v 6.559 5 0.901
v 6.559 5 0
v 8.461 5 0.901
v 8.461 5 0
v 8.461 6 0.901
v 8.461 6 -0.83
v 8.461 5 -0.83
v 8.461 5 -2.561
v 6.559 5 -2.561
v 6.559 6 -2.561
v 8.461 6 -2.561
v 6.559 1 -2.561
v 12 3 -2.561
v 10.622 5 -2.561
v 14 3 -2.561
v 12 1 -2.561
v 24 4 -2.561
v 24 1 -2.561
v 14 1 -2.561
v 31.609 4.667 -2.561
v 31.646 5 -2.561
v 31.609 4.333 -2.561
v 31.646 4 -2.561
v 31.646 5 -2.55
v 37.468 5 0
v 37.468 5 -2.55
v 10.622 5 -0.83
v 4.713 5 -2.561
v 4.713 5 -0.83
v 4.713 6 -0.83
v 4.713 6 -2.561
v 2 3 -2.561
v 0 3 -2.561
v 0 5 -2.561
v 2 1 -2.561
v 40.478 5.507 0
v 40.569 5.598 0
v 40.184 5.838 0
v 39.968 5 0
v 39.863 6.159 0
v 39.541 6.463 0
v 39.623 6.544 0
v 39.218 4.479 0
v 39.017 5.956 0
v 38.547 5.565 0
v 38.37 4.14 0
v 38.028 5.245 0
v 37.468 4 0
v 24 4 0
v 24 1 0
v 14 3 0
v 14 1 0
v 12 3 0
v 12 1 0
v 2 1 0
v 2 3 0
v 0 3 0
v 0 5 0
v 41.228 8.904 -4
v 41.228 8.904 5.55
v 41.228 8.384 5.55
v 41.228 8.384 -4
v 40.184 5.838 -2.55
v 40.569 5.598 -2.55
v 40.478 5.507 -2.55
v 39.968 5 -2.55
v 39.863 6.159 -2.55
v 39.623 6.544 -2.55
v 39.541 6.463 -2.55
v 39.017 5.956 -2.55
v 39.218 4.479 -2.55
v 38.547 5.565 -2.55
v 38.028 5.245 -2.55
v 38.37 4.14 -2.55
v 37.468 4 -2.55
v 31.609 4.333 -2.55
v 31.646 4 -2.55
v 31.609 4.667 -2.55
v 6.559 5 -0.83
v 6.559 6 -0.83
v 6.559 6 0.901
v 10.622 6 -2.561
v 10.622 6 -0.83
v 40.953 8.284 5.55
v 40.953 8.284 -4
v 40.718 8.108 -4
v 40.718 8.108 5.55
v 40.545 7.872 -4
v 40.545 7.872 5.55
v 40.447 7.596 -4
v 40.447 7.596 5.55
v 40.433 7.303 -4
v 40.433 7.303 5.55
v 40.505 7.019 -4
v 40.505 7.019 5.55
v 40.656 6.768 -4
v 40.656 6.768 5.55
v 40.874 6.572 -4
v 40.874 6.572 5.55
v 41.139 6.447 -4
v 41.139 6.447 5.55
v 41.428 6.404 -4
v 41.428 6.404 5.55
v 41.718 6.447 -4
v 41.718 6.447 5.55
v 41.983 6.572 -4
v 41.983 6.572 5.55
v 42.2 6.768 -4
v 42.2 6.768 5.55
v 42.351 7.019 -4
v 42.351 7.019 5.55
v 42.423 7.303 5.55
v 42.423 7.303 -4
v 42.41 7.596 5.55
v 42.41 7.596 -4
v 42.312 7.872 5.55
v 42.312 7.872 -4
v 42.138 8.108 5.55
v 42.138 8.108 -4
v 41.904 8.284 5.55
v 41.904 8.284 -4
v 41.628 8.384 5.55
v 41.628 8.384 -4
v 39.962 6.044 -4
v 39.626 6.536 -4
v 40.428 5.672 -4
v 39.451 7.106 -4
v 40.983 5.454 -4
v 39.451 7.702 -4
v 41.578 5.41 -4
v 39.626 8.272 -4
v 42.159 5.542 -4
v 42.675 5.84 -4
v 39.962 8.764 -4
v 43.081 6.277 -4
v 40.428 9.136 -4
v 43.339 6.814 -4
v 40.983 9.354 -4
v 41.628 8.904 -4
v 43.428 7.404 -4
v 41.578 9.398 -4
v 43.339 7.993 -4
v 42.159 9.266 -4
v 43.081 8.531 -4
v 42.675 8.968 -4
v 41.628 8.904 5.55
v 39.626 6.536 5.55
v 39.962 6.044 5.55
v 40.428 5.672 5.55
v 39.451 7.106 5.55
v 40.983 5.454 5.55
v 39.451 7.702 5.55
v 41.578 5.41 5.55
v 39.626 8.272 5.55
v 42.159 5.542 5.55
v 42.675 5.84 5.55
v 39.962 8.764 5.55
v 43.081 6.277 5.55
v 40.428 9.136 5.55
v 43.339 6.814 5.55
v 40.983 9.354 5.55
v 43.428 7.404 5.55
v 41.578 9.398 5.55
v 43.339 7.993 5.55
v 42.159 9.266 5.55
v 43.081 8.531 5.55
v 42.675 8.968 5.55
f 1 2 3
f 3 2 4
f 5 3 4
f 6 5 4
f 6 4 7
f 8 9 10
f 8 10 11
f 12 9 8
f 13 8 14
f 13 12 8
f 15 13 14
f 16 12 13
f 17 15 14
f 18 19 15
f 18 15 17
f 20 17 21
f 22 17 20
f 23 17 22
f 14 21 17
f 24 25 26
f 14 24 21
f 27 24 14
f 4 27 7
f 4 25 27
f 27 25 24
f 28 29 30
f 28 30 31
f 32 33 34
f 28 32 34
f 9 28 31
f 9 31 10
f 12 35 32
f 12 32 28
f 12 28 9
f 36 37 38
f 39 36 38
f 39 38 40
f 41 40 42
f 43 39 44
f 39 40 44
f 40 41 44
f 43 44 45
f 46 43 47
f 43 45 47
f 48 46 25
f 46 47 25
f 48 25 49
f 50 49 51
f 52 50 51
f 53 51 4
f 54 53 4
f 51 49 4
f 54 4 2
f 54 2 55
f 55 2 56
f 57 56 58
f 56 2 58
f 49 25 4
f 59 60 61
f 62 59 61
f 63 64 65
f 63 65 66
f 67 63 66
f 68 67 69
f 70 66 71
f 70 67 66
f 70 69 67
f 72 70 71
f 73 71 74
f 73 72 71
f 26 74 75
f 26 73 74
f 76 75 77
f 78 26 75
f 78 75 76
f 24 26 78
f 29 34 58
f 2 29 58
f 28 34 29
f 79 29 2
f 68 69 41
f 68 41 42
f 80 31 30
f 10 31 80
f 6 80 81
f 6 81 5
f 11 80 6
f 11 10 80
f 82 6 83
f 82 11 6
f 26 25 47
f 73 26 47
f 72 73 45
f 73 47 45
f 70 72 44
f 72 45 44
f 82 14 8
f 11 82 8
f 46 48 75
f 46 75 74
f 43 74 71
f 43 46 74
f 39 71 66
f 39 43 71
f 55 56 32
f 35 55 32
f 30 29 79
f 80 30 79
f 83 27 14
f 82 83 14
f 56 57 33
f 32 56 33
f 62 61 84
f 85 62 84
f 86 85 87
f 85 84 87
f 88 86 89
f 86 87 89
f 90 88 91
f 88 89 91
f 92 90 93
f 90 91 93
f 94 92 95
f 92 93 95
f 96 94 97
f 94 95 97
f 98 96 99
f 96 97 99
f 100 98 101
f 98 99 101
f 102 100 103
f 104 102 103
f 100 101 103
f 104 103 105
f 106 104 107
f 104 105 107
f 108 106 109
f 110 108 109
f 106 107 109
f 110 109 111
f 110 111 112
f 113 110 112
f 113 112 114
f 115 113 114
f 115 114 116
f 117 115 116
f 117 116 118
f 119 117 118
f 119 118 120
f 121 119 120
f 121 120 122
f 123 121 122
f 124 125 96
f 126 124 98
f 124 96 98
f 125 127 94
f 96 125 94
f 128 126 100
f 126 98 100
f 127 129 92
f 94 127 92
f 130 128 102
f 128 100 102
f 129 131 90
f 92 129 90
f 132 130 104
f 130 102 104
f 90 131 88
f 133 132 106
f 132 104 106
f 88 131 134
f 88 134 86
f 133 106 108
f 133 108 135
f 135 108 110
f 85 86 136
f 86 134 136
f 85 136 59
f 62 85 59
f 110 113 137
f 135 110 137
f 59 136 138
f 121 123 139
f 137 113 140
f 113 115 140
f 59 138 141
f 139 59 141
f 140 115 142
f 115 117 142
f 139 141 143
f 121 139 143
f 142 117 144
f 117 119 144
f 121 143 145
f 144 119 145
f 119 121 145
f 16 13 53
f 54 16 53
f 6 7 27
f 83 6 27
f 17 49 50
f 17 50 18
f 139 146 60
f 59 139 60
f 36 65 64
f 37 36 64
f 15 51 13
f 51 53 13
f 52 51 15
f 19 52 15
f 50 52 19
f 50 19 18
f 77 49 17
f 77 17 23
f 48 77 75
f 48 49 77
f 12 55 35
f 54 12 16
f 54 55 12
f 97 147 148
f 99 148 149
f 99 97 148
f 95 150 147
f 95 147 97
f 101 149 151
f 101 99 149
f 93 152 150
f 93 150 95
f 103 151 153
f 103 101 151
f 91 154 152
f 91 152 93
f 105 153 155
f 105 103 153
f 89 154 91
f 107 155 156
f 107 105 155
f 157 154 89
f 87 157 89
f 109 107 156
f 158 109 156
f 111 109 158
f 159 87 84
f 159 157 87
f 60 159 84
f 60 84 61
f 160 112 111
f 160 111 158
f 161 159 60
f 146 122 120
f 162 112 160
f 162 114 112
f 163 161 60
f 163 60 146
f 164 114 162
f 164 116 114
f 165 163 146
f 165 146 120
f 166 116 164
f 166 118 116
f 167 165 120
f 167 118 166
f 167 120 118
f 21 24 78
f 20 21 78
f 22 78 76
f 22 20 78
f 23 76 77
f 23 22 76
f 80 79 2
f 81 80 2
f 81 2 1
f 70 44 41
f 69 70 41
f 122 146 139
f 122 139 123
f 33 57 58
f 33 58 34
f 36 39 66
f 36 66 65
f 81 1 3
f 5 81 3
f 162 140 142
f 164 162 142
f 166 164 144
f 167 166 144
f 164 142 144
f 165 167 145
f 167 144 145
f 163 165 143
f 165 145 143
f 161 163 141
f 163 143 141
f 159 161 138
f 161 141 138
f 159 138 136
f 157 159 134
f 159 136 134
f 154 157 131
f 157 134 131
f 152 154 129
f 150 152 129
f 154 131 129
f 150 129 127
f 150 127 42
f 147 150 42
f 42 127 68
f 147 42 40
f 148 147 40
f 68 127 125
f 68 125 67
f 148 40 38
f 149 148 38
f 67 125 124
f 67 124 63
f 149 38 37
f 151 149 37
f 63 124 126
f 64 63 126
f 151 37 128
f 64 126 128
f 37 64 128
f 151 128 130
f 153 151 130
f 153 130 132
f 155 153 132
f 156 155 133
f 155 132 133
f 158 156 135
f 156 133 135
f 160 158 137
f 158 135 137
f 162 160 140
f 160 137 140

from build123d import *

# Parameters (mm, degrees)
SKETCH1_W                 = 14
SKETCH1_H                 = 10
BOSS_EXTRUDE1_DEPTH       = 5
SKETCH2_W                 = 1.137458902
SKETCH2_H                 = 1.700915576
SKETCH2_W_2               = 1
SKETCH2_H_2               = 2
BOSS_EXTRUDE2_DEPTH       = 3
SKETCH3_W                 = 14
SKETCH3_H                 = 10
CUT_EXTRUDE1_DEPTH        = 3
BOSS_EXTRUDE3_DEPTH       = 9
SKETCH6_W                 = 10
SKETCH6_H                 = 2
BOSS_EXTRUDE4_DEPTH       = 43
BOSS_EXTRUDE5_DEPTH       = 23
BOSS_EXTRUDE5_DEPTH_BACK  = 14
SKETCH7_R                 = 5
SKETCH8_W                 = 10
SKETCH8_H                 = 3
BOSS_EXTRUDE6_DEPTH       = 9
SKETCH9_W                 = 1.004791017
SKETCH9_H                 = 1.799084424
SKETCH9_W_2               = 0.997604491
SKETCH9_W_3               = 1.997604492
SKETCH9_H_2               = 1.5
BOSS_EXTRUDE7_DEPTH       = 3
SKETCH10_W                = 1.001197754
SKETCH10_H                = 2.999195309
CUT_EXTRUDE2_DEPTH        = 3
CUT_EXTRUDE3_DEPTH        = 43
SKETCH12_W                = 2.137458902
SKETCH12_H                = 2
SKETCH12_W_2              = 1
SKETCH12_H_2              = 1.700915576
SKETCH12_W_3              = 0.862541098
SKETCH12_W_4              = 1.997604492
SKETCH12_H_3              = 1.5
SKETCH12_H_4              = 3
SKETCH12_W_5              = 1.001197754
CUT_EXTRUDE4_DEPTH        = 4
SKETCH14_W                = 28.101020514
SKETCH14_H                = 7
CUT_EXTRUDE6_DEPTH        = 4
SKETCH15_W                = 1.997604492
SKETCH15_H                = 1.337298545
SKETCH15_W_2              = 2.137458902
SKETCH15_H_2              = 1.038214121
BOSS_EXTRUDE8_DEPTH       = 1
SKETCH16_W                = 2.161329906
SKETCH16_H                = 1.731474724
SKETCH16_W_2              = 1.90188885
SKETCH16_H_2              = 1.406872125
SKETCH16_H_3              = 0.901189682
SKETCH16_W_3              = 1.846086898
SKETCH16_H_4              = 0.829910231
SKETCH16_H_5              = 0.438615045
BOSS_EXTRUDE9_DEPTH       = 1
SKETCH17_W                = 28.101020514
SKETCH17_H                = 3
CUT_EXTRUDE7_DEPTH        = 1
CUT_EXTRUDE8_START        = -7
SKETCH18_R                = 5
CUT_EXTRUDE8_DEPTH        = 7
SKETCH19_R                = 5
CUT_EXTRUDE9_DEPTH        = 8
CUT_EXTRUDE10_START       = -31
SKETCH20_R                = 5
CUT_EXTRUDE10_DEPTH       = 31
SKETCH21_W                = 17.497056098
SKETCH21_H                = 3
CUT_EXTRUDE11_DEPTH       = 31
SKETCH22_W                = 10
SKETCH22_H                = 3
CUT_EXTRUDE12_DEPTH       = 7
SKETCH23_W                = 1.90188885
SKETCH23_H                = 1.406872125
CUT_EXTRUDE13_DEPTH       = 2
BOSS_EXTRUDE10_DEPTH      = 10
BOSS_EXTRUDE10_DEPTH_BACK = 6
SKETCH24_R                = 3
CUT_EXTRUDE14_DEPTH       = 16
CUT_EXTRUDE18_START       = -10
SKETCH26_R                = 3
SKETCH26_R_2              = 2.5
CUT_EXTRUDE18_DEPTH       = 10
SKETCH27_R                = 3
CUT_EXTRUDE19_DEPTH       = 3
CUT_EXTRUDE20_START       = -4
SKETCH28_R                = 2.5
CUT_EXTRUDE20_DEPTH       = 4
CUT_EXTRUDE22_DEPTH       = 2
CUT_EXTRUDE22_DEPTH_BACK  = 7
SKETCH29_W                = 4.063218756
SKETCH29_H                = 0.438615045
SKETCH29_W_2              = 21.023429879
CUT_EXTRUDE23_START       = -10
SKETCH30_R                = 3
CUT_EXTRUDE23_DEPTH       = 10
BOSS_EXTRUDE11_START      = -2.55
BOSS_EXTRUDE11_DEPTH      = 2.55
BOSS_EXTRUDE12_DEPTH      = 7.55
BOSS_EXTRUDE12_DEPTH_BACK = 6
CUT_EXTRUDE24_DEPTH       = 13.55
BOSS_EXTRUDE13_DEPTH      = 2.55
BOSS_EXTRUDE14_DEPTH      = 6.55
BOSS_EXTRUDE14_DEPTH_BACK = 4
SKETCH35_R                = 2
CUT_EXTRUDE25_START       = -14.55
SKETCH36_R                = 2
CUT_EXTRUDE25_DEPTH       = 14.55
BOSS_EXTRUDE15_DEPTH      = 2.55
SKETCH38_R                = 1
CUT_EXTRUDE26_DEPTH       = 16.55
SKETCH39_R                = 2
CUT_EXTRUDE27_DEPTH       = 10.55
BOSS_EXTRUDE16_DEPTH      = 2.55
BOSS_EXTRUDE17_DEPTH      = 5.55
BOSS_EXTRUDE17_DEPTH_BACK = 4
SKETCH41_R                = 2
SKETCH42_R                = 1
CUT_EXTRUDE28_DEPTH       = 13.55


with BuildPart() as part:
    # Sketch1 → Boss-Extrude1 (new body)
    with BuildSketch(Plane(origin=(0, 0, 0), x_dir=(1, 0, 0), z_dir=(0, 1, 0))):
        with Locations((7, 5)):
            Rectangle(SKETCH1_W, SKETCH1_H)
    extrude(amount=BOSS_EXTRUDE1_DEPTH)

    # Sketch2 → Boss-Extrude2 (add)
    with BuildSketch(Plane(origin=(0, 5, 0), x_dir=(1, 0, 0), z_dir=(0, 1, 0))):
        with Locations((7.568729451, 6.812243667)):
            Rectangle(SKETCH2_W, SKETCH2_H)
        with Locations((6.5, 6.812243667)):
            Rectangle(SKETCH2_W_2, SKETCH2_H)
        Polygon((7, 5), (7, 5.961785879), (6, 5.961785879), (5, 5.961785879), (5, 5), align=None)
        Polygon((7, 3.961785879), (7, 5), (5, 5), (5, 3.961785879), (6, 3.961785879), align=None)
        Polygon((8.137458902, 5.961785879), (7, 5.961785879), (7, 5), (9, 5), (9, 5.961785879), align=None)
        Polygon((9, 5), (7, 5), (7, 3.961785879), (8.137458902, 3.961785879), (9, 3.961785879), align=None)
        with Locations((6.5, 2.961785879)):
            Rectangle(SKETCH2_W_2, SKETCH2_H_2)
        with Locations((7.568729451, 2.961785879)):
            Rectangle(SKETCH2_W, SKETCH2_H_2)
    extrude(amount=BOSS_EXTRUDE2_DEPTH)

    # Sketch3 → Cut-Extrude1 (cut)
    with BuildSketch(Plane.XZ):
        with Locations((7, -5)):
            Rectangle(SKETCH3_W, SKETCH3_H)
    extrude(amount=-CUT_EXTRUDE1_DEPTH, mode=Mode.SUBTRACT)

    # Sketch5 → Boss-Extrude3 (add)
    with BuildSketch(Plane.XZ.offset(-3)):
        Polygon((12, 0), (7, 0), (2, 0), (2, -3), (12, -3), align=None)
    extrude(amount=BOSS_EXTRUDE3_DEPTH)

    # Sketch6 → Boss-Extrude4 (add)
    with BuildSketch(Plane(origin=(14, 0, 0), x_dir=(0, 0, -1), z_dir=(1, 0, 0))):
        with Locations((5, 4)):
            Rectangle(SKETCH6_W, SKETCH6_H)
    extrude(amount=BOSS_EXTRUDE4_DEPTH)

    # Sketch7 → Boss-Extrude5 (add, two sides: drawn at the far end of the back side and taken through both)
    with BuildSketch(Plane.XY.offset(-BOSS_EXTRUDE5_DEPTH_BACK)):
        with Locations((57, 4)):
            Circle(SKETCH7_R)
    extrude(amount=BOSS_EXTRUDE5_DEPTH + BOSS_EXTRUDE5_DEPTH_BACK)

    # Sketch8 → Boss-Extrude6 (add)
    with BuildSketch(Plane(origin=(0, 3, 0), x_dir=(-1, 0, 0), z_dir=(0, -1, 0))):
        with Locations((-19, 1.5)):
            Rectangle(SKETCH8_W, SKETCH8_H)
    extrude(amount=BOSS_EXTRUDE6_DEPTH)

    # Sketch9 → Boss-Extrude7 (add)
    with BuildSketch(Plane(origin=(0, 5, 0), x_dir=(1, 0, 0), z_dir=(0, 1, 0))):
        Polygon((17.004791017, 6.161896764), (17.004791017, 5.457884441), (18.002395508, 5.20983516), (18.002395508, 6.161896764), align=None)
        Polygon((16, 6.161896764), (16, 5.707720615), (17.004791017, 5.457884441), (17.004791017, 6.161896764), (16.100648674, 6.161896764), align=None)
        Polygon((16, 5.707720615), (16, 4.961785879), (17.004791017, 4.961785879), (17.004791017, 5.457884441), align=None)
        Polygon((17.004791017, 5.457884441), (17.004791017, 4.961785879), (18.002395508, 4.961785879), (18.002395508, 5.20983516), align=None)
        with Locations((16.502395509, 4.062243667)):
            Rectangle(SKETCH9_W, SKETCH9_H)
        with Locations((17.503593263, 4.062243667)):
            Rectangle(SKETCH9_W_2, SKETCH9_H)
        Polygon((18.002395508, 5.20983516), (18.002395508, 4.961785879), (19, 4.961785879), align=None)
        Polygon((19, 4.961785879), (18.002395508, 4.961785879), (18.002395508, 3.162701455), (20, 3.162701455), (20, 4.662701455), (20, 6.162701455), (20, 7.662701455), (19, 7.662701455), (18.002395508, 7.662701455), (18.002395508, 6.161896764), (18.002395508, 5.20983516), align=None)
        Polygon((20, 4.662701455), (20, 3.162701455), (21, 3.162701455), (21, 6.162701455), (20, 6.162701455), align=None)
        with Locations((19.001197754, 2.412701455)):
            Rectangle(SKETCH9_W_3, SKETCH9_H_2)
    extrude(amount=BOSS_EXTRUDE7_DEPTH)

    # Sketch10 → Cut-Extrude2 (cut)
    with BuildSketch(Plane(origin=(0, 8, 0), x_dir=(1, 0, 0), z_dir=(0, 1, 0))):
        with Locations((16.500598877, 4.66229911)):
            Rectangle(SKETCH10_W, SKETCH10_H)
    extrude(amount=-CUT_EXTRUDE2_DEPTH, mode=Mode.SUBTRACT)

    # Sketch11 → Cut-Extrude3 (cut)
    with BuildSketch(Plane.XY.offset(23)):
        with BuildLine():
            Line((56.5, 6.795107369), (56.5, 5.936491673))
            ThreePointArc((56.5, 5.936491673), (56.747991415, 5.984059393), (57, 6))
            Line((57, 6), (57, 6.795107369))
            Line((57, 6.795107369), (56.5, 6.795107369))
        make_face()
        with BuildLine():
            ThreePointArc((57, 6), (57.252008585, 5.984059393), (57.5, 5.936491673))
            Line((57.5, 5.936491673), (57.5, 6.795107369))
            Line((57.5, 6.795107369), (57, 6.795107369))
            Line((57, 6.795107369), (57, 6))
        make_face()
        with BuildLine():
            ThreePointArc((56.5, 5.936491673), (55.41886117, 5.224744871), (55, 4))
            Line((55, 4), (59, 4))
            ThreePointArc((59, 4), (58.58113883, 5.224744871), (57.5, 5.936491673))
            ThreePointArc((57.5, 5.936491673), (57.252008585, 5.984059393), (57, 6))
            ThreePointArc((57, 6), (56.747991415, 5.984059393), (56.5, 5.936491673))
        make_face()
        with BuildLine():
            Line((59, 4), (55, 4))
            ThreePointArc((55, 4), (57, 2), (59, 4))
        make_face()
    extrude(amount=-CUT_EXTRUDE3_DEPTH, mode=Mode.SUBTRACT)

    # Sketch12 → Cut-Extrude4 (cut)
    with BuildSketch(Plane(origin=(0, 8, 0), x_dir=(1, 0, 0), z_dir=(0, 1, 0))):
        with Locations((7.068729451, 2.961785879)):
            Rectangle(SKETCH12_W, SKETCH12_H)
        with Locations((7.068729451, 4.961785879)):
            Rectangle(SKETCH12_W, SKETCH12_H)
        with Locations((5.5, 4.961785879)):
            Rectangle(SKETCH12_W_2, SKETCH12_H)
        with Locations((7.068729451, 6.812243667)):
            Rectangle(SKETCH12_W, SKETCH12_H_2)
        with Locations((8.568729451, 4.961785879)):
            Rectangle(SKETCH12_W_3, SKETCH12_H)
        with Locations((19.001197754, 2.412701455)):
            Rectangle(SKETCH12_W_4, SKETCH12_H_3)
        with Locations((19.001197754, 4.662701455)):
            Rectangle(SKETCH12_W_4, SKETCH12_H_4)
        with Locations((20.5, 4.662701455)):
            Rectangle(SKETCH12_W_2, SKETCH12_H_4)
        with Locations((19.001197754, 6.912701455)):
            Rectangle(SKETCH12_W_4, SKETCH12_H_3)
        with Locations((17.501796631, 4.662701455)):
            Rectangle(SKETCH12_W_5, SKETCH12_H_4)
    extrude(amount=-CUT_EXTRUDE4_DEPTH, mode=Mode.SUBTRACT)

    # Sketch14 → Cut-Extrude6 (cut)
    with BuildSketch(Plane.XZ.offset(-3)):
        Polygon((0, -3), (0, -10), (24, -10), (24, -3), (14, -3), (12, -3), (2, -3), align=None)
        with Locations((38.050510257, -6.5)):
            Rectangle(SKETCH14_W, SKETCH14_H)
    extrude(amount=-CUT_EXTRUDE6_DEPTH, mode=Mode.SUBTRACT)

    # Sketch15 → Boss-Extrude8 (add)
    with BuildSketch(Plane(origin=(0, 4, 0), x_dir=(1, 0, 0), z_dir=(0, 1, 0))):
        with Locations((19.001197754, 2.331350728)):
            Rectangle(SKETCH15_W, SKETCH15_H)
        with Locations((7.068729451, 2.48089294)):
            Rectangle(SKETCH15_W_2, SKETCH15_H_2)
    extrude(amount=BOSS_EXTRUDE8_DEPTH)

    # Sketch16 → Boss-Extrude9 (add)
    with BuildSketch(Plane(origin=(0, 5, 0), x_dir=(1, 0, 0), z_dir=(0, 1, 0))):
        with Locations((9.541829693, 1.695647593)):
            Rectangle(SKETCH16_W, SKETCH16_H)
        with Locations((7.510220315, 1.695647593)):
            Rectangle(SKETCH16_W_2, SKETCH16_H)
        with Locations((7.510220315, 3.703436063)):
            Rectangle(SKETCH16_W_2, SKETCH16_H_2)
        with Locations((7.510220315, -0.450594841)):
            Rectangle(SKETCH16_W_2, SKETCH16_H_3)
        with Locations((5.636232441, 1.695647593)):
            Rectangle(SKETCH16_W_3, SKETCH16_H)
        with Locations((7.510220315, 0.414955116)):
            Rectangle(SKETCH16_W_2, SKETCH16_H_4)
        with Locations((7.510220315, 2.780692478)):
            Rectangle(SKETCH16_W_2, SKETCH16_H_5)
    extrude(amount=BOSS_EXTRUDE9_DEPTH)

    # Sketch17 → Cut-Extrude7 (cut)
    with BuildSketch(Plane.XZ.offset(-3)):
        with Locations((38.050510257, -1.5)):
            Rectangle(SKETCH17_W, SKETCH17_H)
    extrude(amount=-CUT_EXTRUDE7_DEPTH, mode=Mode.SUBTRACT)

    # Sketch18 → Cut-Extrude8 (cut)
    with BuildSketch(Plane.XY.offset(23).offset(CUT_EXTRUDE8_START)):
        with Locations((57, 4)):
            Circle(SKETCH18_R)
    extrude(amount=CUT_EXTRUDE8_DEPTH, mode=Mode.SUBTRACT)

    # Sketch19 → Cut-Extrude9 (cut)
    with BuildSketch(Plane(origin=(0, 0, -14), x_dir=(-1, 0, 0), z_dir=(0, 0, -1))):
        with Locations((-57, 4)):
            Circle(SKETCH19_R)
    extrude(amount=-CUT_EXTRUDE9_DEPTH, mode=Mode.SUBTRACT)

    # Sketch20 → Cut-Extrude10 (cut)
    with BuildSketch(Plane.XY.offset(16).offset(CUT_EXTRUDE10_START)):
        with Locations((57, 4)):
            Circle(SKETCH20_R)
    extrude(amount=CUT_EXTRUDE10_DEPTH, mode=Mode.SUBTRACT)

    # Sketch21 → Cut-Extrude11 (cut)
    with BuildSketch(Plane(origin=(0, 5, 0), x_dir=(1, 0, 0), z_dir=(0, 1, 0))):
        with Locations((43.352492465, 1.5)):
            Rectangle(SKETCH21_W, SKETCH21_H)
    extrude(amount=-CUT_EXTRUDE11_DEPTH, mode=Mode.SUBTRACT)

    # Sketch22 → Cut-Extrude12 (cut)
    with BuildSketch(Plane.XZ.offset(6)):
        with Locations((7, -1.5)):
            Rectangle(SKETCH22_W, SKETCH22_H)
        with Locations((19, -1.5)):
            Rectangle(SKETCH22_W, SKETCH22_H)
    extrude(amount=-CUT_EXTRUDE12_DEPTH, mode=Mode.SUBTRACT)

    # Sketch23 → Cut-Extrude13 (cut)
    with BuildSketch(Plane(origin=(0, 6, 0), x_dir=(1, 0, 0), z_dir=(0, 1, 0))):
        with Locations((7.510220315, 3.703436063)):
            Rectangle(SKETCH23_W, SKETCH23_H)
    extrude(amount=-CUT_EXTRUDE13_DEPTH, mode=Mode.SUBTRACT)

    # Sketch24 → Boss-Extrude10 (add, two sides: drawn at the far end of the back side and taken through both)
    with BuildSketch(Plane.XY.offset(-BOSS_EXTRUDE10_DEPTH_BACK)):
        with Locations((34.603964416, 4.5)):
            Circle(SKETCH24_R)
    extrude(amount=BOSS_EXTRUDE10_DEPTH + BOSS_EXTRUDE10_DEPTH_BACK)

    # Sketch25 → Cut-Extrude14 (cut)
    with BuildSketch(Plane.XY.offset(10)):
        with BuildLine():
            ThreePointArc((34.403964416, 5.479795897), (33.829367747, 5.132455532), (33.603964416, 4.5))
            Line((33.603964416, 4.5), (35.603964416, 4.5))
            ThreePointArc((35.603964416, 4.5), (35.378561086, 5.132455532), (34.803964416, 5.479795897))
            ThreePointArc((34.803964416, 5.479795897), (34.704473378, 5.494936153), (34.603964416, 5.5))
            ThreePointArc((34.603964416, 5.5), (34.503455454, 5.494936153), (34.403964416, 5.479795897))
        make_face()
        with BuildLine():
            Line((35.603964416, 4.5), (33.603964416, 4.5))
            ThreePointArc((33.603964416, 4.5), (34.603964416, 3.5), (35.603964416, 4.5))
        make_face()
        Polygon((34.803964416, 5.479795897), (34.603964416, 6), (34.803964416, 6), align=None)
        with BuildLine():
            ThreePointArc((34.603964416, 5.5), (34.704473378, 5.494936153), (34.803964416, 5.479795897))
            Line((34.803964416, 5.479795897), (34.603964416, 6))
            Line((34.603964416, 6), (34.603964416, 5.5))
        make_face()
        with BuildLine():
            Line((34.403964416, 6), (34.403964416, 5.479795897))
            ThreePointArc((34.403964416, 5.479795897), (34.503455454, 5.494936153), (34.603964416, 5.5))
            Line((34.603964416, 5.5), (34.603964416, 6))
            Line((34.603964416, 6), (34.403964416, 6))
        make_face()
    extrude(amount=-CUT_EXTRUDE14_DEPTH, mode=Mode.SUBTRACT)

    # Sketch26 → Cut-Extrude18 (cut)
    with BuildSketch(Plane.XY.offset(10).offset(CUT_EXTRUDE18_START)):
        with Locations((34.603964416, 4.5)):
            Circle(SKETCH26_R)
        with Locations((34.603964416, 4.5)):
            Circle(SKETCH26_R_2, mode=Mode.SUBTRACT)
    extrude(amount=CUT_EXTRUDE18_DEPTH, mode=Mode.SUBTRACT)

    # Sketch27 → Cut-Extrude19 (cut)
    with BuildSketch(Plane(origin=(0, 0, -6), x_dir=(-1, 0, 0), z_dir=(0, 0, -1))):
        with Locations((-34.603964416, 4.5)):
            Circle(SKETCH27_R)
    extrude(amount=-CUT_EXTRUDE19_DEPTH, mode=Mode.SUBTRACT)

    # Sketch28 → Cut-Extrude20 (cut)
    with BuildSketch(Plane.XY.offset(10).offset(CUT_EXTRUDE20_START)):
        with Locations((34.603964416, 4.5)):
            Circle(SKETCH28_R)
    extrude(amount=CUT_EXTRUDE20_DEPTH, mode=Mode.SUBTRACT)

    # Sketch29 → Cut-Extrude22 (cut, two sides: drawn at the far end of the back side and taken through both)
    with BuildSketch(Plane(origin=(0, 5, 0), x_dir=(1, 0, 0), z_dir=(0, 1, 0)).offset(-CUT_EXTRUDE22_DEPTH_BACK)):
        Polygon((6.55927589, 3), (0, 3), (0, 2.561384955), (4.713188992, 2.561384955), (6.55927589, 2.561384955), align=None)
        with Locations((8.590885268, 2.780692478)):
            Rectangle(SKETCH29_W, SKETCH29_H)
        with Locations((21.134209586, 2.780692478)):
            Rectangle(SKETCH29_W_2, SKETCH29_H)
    extrude(amount=CUT_EXTRUDE22_DEPTH + CUT_EXTRUDE22_DEPTH_BACK, mode=Mode.SUBTRACT)

    # Sketch30 → Cut-Extrude23 (cut)
    with BuildSketch(Plane.XY.offset(6).offset(CUT_EXTRUDE23_START)):
        with Locations((34.603964416, 4.5)):
            Circle(SKETCH30_R)
    extrude(amount=CUT_EXTRUDE23_DEPTH, mode=Mode.SUBTRACT)

    # Sketch31 → Boss-Extrude11 (add)
    with BuildSketch(Plane.XY.offset(BOSS_EXTRUDE11_START)):
        with BuildLine():
            ThreePointArc((31.645924525, 5), (31.603964416, 4.5), (31.645924525, 4))
            Line((31.645924525, 4), (37.467734395, 4))
            Line((37.467734395, 4), (37.467734395, 5))
            Line((37.467734395, 5), (31.645924525, 5))
        make_face()
    extrude(amount=BOSS_EXTRUDE11_DEPTH)

    # Sketch32 → Boss-Extrude12 (add, two sides: drawn at the far end of the back side and taken through both)
    with BuildSketch(Plane.XY.offset(-BOSS_EXTRUDE12_DEPTH_BACK)):
        with BuildLine():
            ThreePointArc((36.037292469, 5), (34.100800796, 6.5), (32.164309123, 5))
            Line((32.164309123, 5), (34.100800796, 5))
            Line((34.100800796, 5), (36.037292469, 5))
        make_face()
        with BuildLine():
            ThreePointArc((32.164309123, 5), (32.100800796, 4.5), (32.164309123, 4))
            Line((32.164309123, 4), (34.100800796, 4))
            Line((34.100800796, 4), (34.100800796, 5))
            Line((34.100800796, 5), (32.164309123, 5))
        make_face()
        with BuildLine():
            Line((34.100800796, 5), (34.100800796, 4))
            Line((34.100800796, 4), (36.037292469, 4))
            ThreePointArc((36.037292469, 4), (36.084860189, 4.247991415), (36.100800796, 4.5))
            ThreePointArc((36.100800796, 4.5), (36.084860189, 4.752008585), (36.037292469, 5))
            Line((36.037292469, 5), (34.100800796, 5))
        make_face()
        with BuildLine():
            Line((34.100800796, 4), (32.164309123, 4))
            ThreePointArc((32.164309123, 4), (34.100800796, 2.5), (36.037292469, 4))
            Line((36.037292469, 4), (34.100800796, 4))
        make_face()
    extrude(amount=BOSS_EXTRUDE12_DEPTH + BOSS_EXTRUDE12_DEPTH_BACK)

    # Sketch33 → Cut-Extrude24 (cut)
    with BuildSketch(Plane.XY.offset(7.55)):
        with BuildLine():
            ThreePointArc((33.900800796, 5.479795897), (33.326204127, 5.132455532), (33.100800796, 4.5))
            Line((33.100800796, 4.5), (35.100800796, 4.5))
            ThreePointArc((35.100800796, 4.5), (34.875397465, 5.132455532), (34.300800796, 5.479795897))
            ThreePointArc((34.300800796, 5.479795897), (34.201309758, 5.494936153), (34.100800796, 5.5))
            ThreePointArc((34.100800796, 5.5), (34.000291834, 5.494936153), (33.900800796, 5.479795897))
        make_face()
        with BuildLine():
            Line((35.100800796, 4.5), (33.100800796, 4.5))
            ThreePointArc((33.100800796, 4.5), (34.100800796, 3.5), (35.100800796, 4.5))
        make_face()
        with BuildLine():
            ThreePointArc((34.100800796, 5.5), (34.201309758, 5.494936153), (34.300800796, 5.479795897))
            Line((34.300800796, 5.479795897), (34.100800796, 6))
            Line((34.100800796, 6), (34.100800796, 5.5))
        make_face()
        Polygon((34.300800796, 5.479795897), (34.100800796, 6), (34.300800796, 6), align=None)
        with BuildLine():
            Line((33.900800796, 6), (33.900800796, 5.479795897))
            ThreePointArc((33.900800796, 5.479795897), (34.000291834, 5.494936153), (34.100800796, 5.5))
            Line((34.100800796, 5.5), (34.100800796, 6))
            Line((34.100800796, 6), (33.900800796, 6))
        make_face()
    extrude(amount=-CUT_EXTRUDE24_DEPTH, mode=Mode.SUBTRACT)

    # Sketch34 → Boss-Extrude13 (add)
    with BuildSketch(Plane.XY):
        with BuildLine():
            ThreePointArc((37.467734395, 4), (38.803514189, 4.285550514), (39.967734395, 5))
            Line((39.967734395, 5), (37.467734395, 5))
            Line((37.467734395, 5), (37.467734395, 4))
        make_face()
        with BuildLine():
            ThreePointArc((37.467734395, 5), (38.293118446, 5.395747071), (39.0169964, 5.955992807))
            Line((39.0169964, 5.955992807), (39.967734395, 5))
            Line((39.967734395, 5), (37.467734395, 5))
        make_face()
        Polygon((39.967734395, 5), (41.817668177, 6.83976524), (39.0169964, 5.955992807), align=None)
        Polygon((40.892701286, 7.769844503), (41.817668177, 6.83976524), (39.0169964, 5.955992807), align=None)
    extrude(amount=-BOSS_EXTRUDE13_DEPTH)

    # Sketch35 → Boss-Extrude14 (add, two sides: drawn at the far end of the back side and taken through both)
    with BuildSketch(Plane.XY.offset(-BOSS_EXTRUDE14_DEPTH_BACK)):
        with Locations((41.355184732, 7.304804872)):
            Circle(SKETCH35_R)
    extrude(amount=BOSS_EXTRUDE14_DEPTH + BOSS_EXTRUDE14_DEPTH_BACK)

    # Sketch36 → Cut-Extrude25 (cut)
    with BuildSketch(Plane.XY.offset(7.55).offset(CUT_EXTRUDE25_START)):
        with Locations((34.100800796, 4.5)):
            Circle(SKETCH36_R)
    extrude(amount=CUT_EXTRUDE25_DEPTH, mode=Mode.SUBTRACT)


with BuildPart() as cut_extrude25_piece_1:
    # of the separate pieces the step leaves, piece 1, a body of its own (cut_extrude25_pieces)
    add(part.part.solids().sort_by_distance((12, 3, 0))[0])



with BuildPart() as cut_extrude25_piece_2:
    # of the separate pieces the step leaves, piece 2, a body of its own (cut_extrude25_pieces)
    add(part.part.solids().sort_by_distance((36.037292469, 4, 0))[0])


with BuildPart() as cut_extrude25_piece_1_1:
    add(cut_extrude25_piece_1.part)

    add(cut_extrude25_piece_2.part)  # Boss-Extrude15 merges Cut-Extrude25 piece 2
    # Sketch37 → Boss-Extrude15 (add)
    with BuildSketch(Plane.XY):
        with BuildLine():
            ThreePointArc((32.164309123, 5), (32.100800796, 4.5), (32.164309123, 4))
            Line((32.164309123, 4), (37.272107827, 4))
            Line((37.272107827, 4), (37.272107827, 5))
            Line((37.272107827, 5), (32.164309123, 5))
        make_face()
    extrude(amount=-BOSS_EXTRUDE15_DEPTH)

    # Sketch38 → Cut-Extrude26 (cut)
    with BuildSketch(Plane.XY.offset(6.55)):
        with BuildLine():
            Line((41.355184732, 8.304804872), (41.355184732, 8.804804872))
            Line((41.355184732, 8.804804872), (41.155184732, 8.804804872))
            Line((41.155184732, 8.804804872), (41.155184732, 8.284600769))
            ThreePointArc((41.155184732, 8.284600769), (41.25467577, 8.299741025), (41.355184732, 8.304804872))
        make_face()
        with BuildLine():
            Line((41.555184732, 8.804804872), (41.355184732, 8.804804872))
            Line((41.355184732, 8.804804872), (41.355184732, 8.304804872))
            ThreePointArc((41.355184732, 8.304804872), (41.455693694, 8.299741025), (41.555184732, 8.284600769))
            Line((41.555184732, 8.284600769), (41.555184732, 8.804804872))
        make_face()
        with Locations((41.355184732, 7.304804872)):
            Circle(SKETCH38_R)
    extrude(amount=-CUT_EXTRUDE26_DEPTH, mode=Mode.SUBTRACT)

    # Sketch39 → Cut-Extrude27 (cut)
    with BuildSketch(Plane.XY.offset(6.55)):
        with Locations((41.355184732, 7.304804872)):
            Circle(SKETCH39_R)
    extrude(amount=-CUT_EXTRUDE27_DEPTH, mode=Mode.SUBTRACT)

    # Sketch40 → Boss-Extrude16 (add)
    with BuildSketch(Plane.XY):
        with BuildLine():
            Line((40.955285549, 7.877000055), (40.477980987, 5.507441917))
            ThreePointArc((40.477980987, 5.507441917), (39.92726074, 5.904435965), (39.541071987, 6.462786493))
            Line((39.541071987, 6.462786493), (40.955285549, 7.877000055))
        make_face()
        Polygon((40.477980987, 5.507441917), (41.901412338, 6.930873267), (40.955285549, 7.877000055), align=None)
    extrude(amount=-BOSS_EXTRUDE16_DEPTH)

    # Sketch41 → Boss-Extrude17 (add, two sides: drawn at the far end of the back side and taken through both)
    with BuildSketch(Plane.XY.offset(-BOSS_EXTRUDE17_DEPTH_BACK)):
        with Locations((41.428348943, 7.403936661)):
            Circle(SKETCH41_R)
    extrude(amount=BOSS_EXTRUDE17_DEPTH + BOSS_EXTRUDE17_DEPTH_BACK)

    # Sketch42 → Cut-Extrude28 (cut)
    with BuildSketch(Plane.XY.offset(5.55)):
        with Locations((41.428348943, 7.403936661)):
            Circle(SKETCH42_R)
        with BuildLine():
            Line((41.628348943, 8.383732558), (41.428348943, 8.903936661))
            Line((41.428348943, 8.903936661), (41.428348943, 8.403936661))
            ThreePointArc((41.428348943, 8.403936661), (41.528857906, 8.398872814), (41.628348943, 8.383732558))
        make_face()
        Polygon((41.628348943, 8.383732558), (41.428348943, 8.903936661), (41.628348943, 8.903936661), align=None)
        with BuildLine():
            Line((41.428348943, 8.403936661), (41.428348943, 8.903936661))
            Line((41.428348943, 8.903936661), (41.228348943, 8.903936661))
            Line((41.228348943, 8.903936661), (41.228348943, 8.383732558))
            ThreePointArc((41.228348943, 8.383732558), (41.327839981, 8.398872814), (41.428348943, 8.403936661))
        make_face()
    extrude(amount=-CUT_EXTRUDE28_DEPTH, mode=Mode.SUBTRACT)


solid = cut_extrude25_piece_1_1.part
